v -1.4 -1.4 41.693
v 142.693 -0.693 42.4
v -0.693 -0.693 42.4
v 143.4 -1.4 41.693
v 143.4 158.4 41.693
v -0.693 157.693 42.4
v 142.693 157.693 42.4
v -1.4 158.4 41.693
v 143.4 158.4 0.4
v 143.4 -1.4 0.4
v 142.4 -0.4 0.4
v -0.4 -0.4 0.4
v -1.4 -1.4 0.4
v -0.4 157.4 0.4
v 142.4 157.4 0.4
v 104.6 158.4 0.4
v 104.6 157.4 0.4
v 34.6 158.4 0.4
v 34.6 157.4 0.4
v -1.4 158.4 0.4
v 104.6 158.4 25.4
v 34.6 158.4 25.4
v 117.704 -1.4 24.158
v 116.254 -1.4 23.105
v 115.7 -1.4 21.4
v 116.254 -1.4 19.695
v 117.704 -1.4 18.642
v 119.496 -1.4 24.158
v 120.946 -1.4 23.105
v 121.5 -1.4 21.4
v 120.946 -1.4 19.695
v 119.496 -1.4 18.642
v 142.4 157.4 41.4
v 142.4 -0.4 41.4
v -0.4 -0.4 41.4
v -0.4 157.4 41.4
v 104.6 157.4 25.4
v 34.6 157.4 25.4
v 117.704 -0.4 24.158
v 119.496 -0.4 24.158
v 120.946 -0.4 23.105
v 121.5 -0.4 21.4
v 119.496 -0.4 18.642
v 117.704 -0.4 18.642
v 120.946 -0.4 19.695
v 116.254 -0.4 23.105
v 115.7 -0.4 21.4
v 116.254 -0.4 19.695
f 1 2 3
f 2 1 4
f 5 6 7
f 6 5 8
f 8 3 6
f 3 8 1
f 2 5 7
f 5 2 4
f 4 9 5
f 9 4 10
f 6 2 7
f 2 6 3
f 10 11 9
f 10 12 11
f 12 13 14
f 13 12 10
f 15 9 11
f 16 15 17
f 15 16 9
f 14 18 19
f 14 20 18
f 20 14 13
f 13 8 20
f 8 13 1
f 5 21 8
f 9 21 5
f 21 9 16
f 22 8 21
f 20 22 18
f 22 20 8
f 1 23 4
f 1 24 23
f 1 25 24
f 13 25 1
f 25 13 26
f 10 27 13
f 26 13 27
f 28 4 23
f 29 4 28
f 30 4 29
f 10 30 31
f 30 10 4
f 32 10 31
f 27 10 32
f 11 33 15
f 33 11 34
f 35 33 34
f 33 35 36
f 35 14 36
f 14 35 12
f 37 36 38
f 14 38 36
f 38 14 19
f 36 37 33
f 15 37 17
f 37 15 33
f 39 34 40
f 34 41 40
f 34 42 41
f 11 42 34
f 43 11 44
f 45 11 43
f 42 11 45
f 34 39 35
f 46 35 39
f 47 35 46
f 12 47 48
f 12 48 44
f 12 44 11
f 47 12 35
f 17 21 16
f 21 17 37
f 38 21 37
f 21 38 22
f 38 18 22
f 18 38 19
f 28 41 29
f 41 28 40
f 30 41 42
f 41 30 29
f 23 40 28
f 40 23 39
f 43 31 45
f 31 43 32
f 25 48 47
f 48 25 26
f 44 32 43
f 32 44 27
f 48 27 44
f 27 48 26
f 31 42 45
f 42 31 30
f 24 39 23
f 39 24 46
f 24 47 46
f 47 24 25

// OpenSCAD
// Rasperry Pi Free Range / Epson TM-T88 printer stand
//
// Box for holding Raspberry Pi under an Epson TM-T88 receipt printer or similar
// Customizable.
//
// (c) 2014, Laird Popkin laird@popk.in
//


/* [Hidden] */

piWidth = 56;
piLen = 85;
piHeight = 20;
piStandHeight = 5;
piThick = 2;

screwD = 2.9;
screwR = screwD/2;
standR = screwR+2;

sy1 = 25.5;
sx1 = 18;
sy2 = piLen-5;
sx2 = piWidth-12.5;

/* [Parameters] */

// Part to render
part = 2; //[0:Assemble, 1:Base, 2:Top]
// Width in mm
printerWidth = 140;
// Length in mm
printerLen = 155;
// Cable Gap in mm
cableGap = 10;
// Want an LED hole?
haveLED = 1; //[0:No LED, 1:LED]
// LED diameter
ledD = 5;
ledR = ledD/2;
// Does the Pi have standoff holes? Older ones don't.
piStandoffs = 0; //[1:Standoffs, 0:No standoffs]

// compute pi offsets from edge (box width - pi width, etc.)

piWOffset = (printerWidth - piWidth)/2;
piLOffset = (printerLen - piLen)/2;

// Height of stand in mm
height = 40;
// Thickness of walls in mm
thick = 1;
// Gap between inner and outer wall, should be fairly loose
gap = 0.4;

clipHeight = piStandHeight+thick+piThick;

module base() {
	difference() {
		cube([printerWidth+2*thick,printerLen+2*thick,height+thick]);
		translate([thick,thick,thick]) cube([printerWidth, printerLen, height+thick]);
		translate([printerWidth/2+thick, printerLen, height-cableGap/2])
			cube([printerWidth/2, 10, height], center=true);
		translate([-thick-gap,-thick-gap,gap]) led();
		rotate([45,0,0]) translate([-1,-thick/2,-thick/2]) cube([printerWidth+2*thick+2*gap+2,thick,thick]);
		translate([0,printerLen+2*thick,0]) rotate([45,0,0]) translate([-1,-thick/2,-thick/2]) cube([printerWidth+2*thick+2*gap+2,thick,thick]);
		rotate([0,45,0]) translate([-thick/2,-1,-thick/2]) cube([thick,printerLen+2*thick+2*gap+2,thick]);
		translate([printerWidth+2*thick,0,0]) rotate([0,45,0]) translate([-thick/2,-1,-thick/2]) cube([thick,printerLen+2*thick+2*gap+2,thick]);
		}
	translate([piWOffset,piLOffset,thick]) {
		cube([piWidth,piLen,thick]);
		difference() {
			union() {
				translate([-thick,-thick,0]) cube([10,10,clipHeight]);
				translate([-thick,piLen-10+thick,0]) cube([10,10,clipHeight]);
				translate([piWidth+thick-2,-thick,0]) cube([4,10,clipHeight]);
				translate([piWidth+thick-2,piLen-10+thick,0]) cube([4,10,clipHeight]);
				}
			translate([0,0,piStandHeight]) cube([piWidth,piLen,piThick]);
			translate([thick,thick,0]) cube([piWidth-2*thick,piLen-2*thick,10]);
			}
		translate([sx1,sy1,0]) standoff();
		translate([sx2,sy2,0]) standoff();
		}
	difference() {
		translate([-thick-gap,-thick-gap,gap]) ledTube();
		translate([-thick-gap,-thick-gap,gap]) led();
		}
	}

// goes below pi to hold it up
module standoff() {
	if (piStandoffs) {
		cylinder(r=screwR,h=piStandHeight+5);
		cylinder(r=standR,h=piStandHeight);
		}
	}

// goes on top of pi to hold it down (onto standoffs)
module standon() {
	if (piStandoffs) {
		difference() {
			translate([0,0,piStandHeight+piThick]) cylinder(r=standR,h=height-piStandHeight+2*gap-piThick);
			cylinder(r=screwR+gap,h=height);
			}
		}
	}

module led() {
	if (haveLED) {
		translate([printerWidth-height/2,0,height/2+thick])
			rotate([90,0,0]) cylinder(r=ledR+gap, h=20, center=true);
		}
	}

module ledTube() {
	if (haveLED) {
		translate([printerWidth-height/2,8+thick+gap,height/2+thick]) {
			rotate([90,0,0]) cylinder(r=ledR+gap+thick, h=8, center=false);
			translate([-thick/2,-8,-height/2-thick]) cube([thick,8,height/2]);
			}
		}
	}

module cover() {
	translate([-thick-gap,-thick-gap,gap]) difference() {
		cube([printerWidth+4*thick+2*gap,printerLen+4*thick+2*gap,height+2*thick]);
		translate([thick,thick,-1]) cube([printerWidth+2*thick+2*gap, printerLen+2*thick+2*gap, height+thick+1]);
		translate([printerWidth/2+thick, printerLen, cableGap/2])
			cube([printerWidth/2, 10, height], center=true);
		led();
		translate([0,0,height+2*thick]) {
			rotate([45,0,0]) translate([-1,-thick/2,-thick/2]) cube([printerWidth+4*thick+4*gap+2,thick,thick]);
			translate([0,printerLen+4*thick+2*gap,0]) rotate([45,0,0]) translate([-1,-thick/2,-thick/2]) cube([printerWidth+4*thick+4*gap+2,thick,thick]);
			rotate([0,45,0]) translate([-thick/2,-1,-thick/2]) cube([thick,printerLen+4*thick+4*gap+2,thick]);
			translate([printerWidth+4*thick+2*gap,0,0]) rotate([0,45,0]) translate([-thick/2,-1,-thick/2]) cube([thick,printerLen+4*thick+4*gap+2,thick]);
			}
		}
	translate([piWOffset,piLOffset,thick]) {
		//cube([piWidth,piLen,thick]);
		translate([sx1,sy1,0]) standon();
		translate([sx2,sy2,0]) standon();
		}
	}

if ((part==0) || (part==1)) base();
if ((part==0) || (part==2)) cover();
